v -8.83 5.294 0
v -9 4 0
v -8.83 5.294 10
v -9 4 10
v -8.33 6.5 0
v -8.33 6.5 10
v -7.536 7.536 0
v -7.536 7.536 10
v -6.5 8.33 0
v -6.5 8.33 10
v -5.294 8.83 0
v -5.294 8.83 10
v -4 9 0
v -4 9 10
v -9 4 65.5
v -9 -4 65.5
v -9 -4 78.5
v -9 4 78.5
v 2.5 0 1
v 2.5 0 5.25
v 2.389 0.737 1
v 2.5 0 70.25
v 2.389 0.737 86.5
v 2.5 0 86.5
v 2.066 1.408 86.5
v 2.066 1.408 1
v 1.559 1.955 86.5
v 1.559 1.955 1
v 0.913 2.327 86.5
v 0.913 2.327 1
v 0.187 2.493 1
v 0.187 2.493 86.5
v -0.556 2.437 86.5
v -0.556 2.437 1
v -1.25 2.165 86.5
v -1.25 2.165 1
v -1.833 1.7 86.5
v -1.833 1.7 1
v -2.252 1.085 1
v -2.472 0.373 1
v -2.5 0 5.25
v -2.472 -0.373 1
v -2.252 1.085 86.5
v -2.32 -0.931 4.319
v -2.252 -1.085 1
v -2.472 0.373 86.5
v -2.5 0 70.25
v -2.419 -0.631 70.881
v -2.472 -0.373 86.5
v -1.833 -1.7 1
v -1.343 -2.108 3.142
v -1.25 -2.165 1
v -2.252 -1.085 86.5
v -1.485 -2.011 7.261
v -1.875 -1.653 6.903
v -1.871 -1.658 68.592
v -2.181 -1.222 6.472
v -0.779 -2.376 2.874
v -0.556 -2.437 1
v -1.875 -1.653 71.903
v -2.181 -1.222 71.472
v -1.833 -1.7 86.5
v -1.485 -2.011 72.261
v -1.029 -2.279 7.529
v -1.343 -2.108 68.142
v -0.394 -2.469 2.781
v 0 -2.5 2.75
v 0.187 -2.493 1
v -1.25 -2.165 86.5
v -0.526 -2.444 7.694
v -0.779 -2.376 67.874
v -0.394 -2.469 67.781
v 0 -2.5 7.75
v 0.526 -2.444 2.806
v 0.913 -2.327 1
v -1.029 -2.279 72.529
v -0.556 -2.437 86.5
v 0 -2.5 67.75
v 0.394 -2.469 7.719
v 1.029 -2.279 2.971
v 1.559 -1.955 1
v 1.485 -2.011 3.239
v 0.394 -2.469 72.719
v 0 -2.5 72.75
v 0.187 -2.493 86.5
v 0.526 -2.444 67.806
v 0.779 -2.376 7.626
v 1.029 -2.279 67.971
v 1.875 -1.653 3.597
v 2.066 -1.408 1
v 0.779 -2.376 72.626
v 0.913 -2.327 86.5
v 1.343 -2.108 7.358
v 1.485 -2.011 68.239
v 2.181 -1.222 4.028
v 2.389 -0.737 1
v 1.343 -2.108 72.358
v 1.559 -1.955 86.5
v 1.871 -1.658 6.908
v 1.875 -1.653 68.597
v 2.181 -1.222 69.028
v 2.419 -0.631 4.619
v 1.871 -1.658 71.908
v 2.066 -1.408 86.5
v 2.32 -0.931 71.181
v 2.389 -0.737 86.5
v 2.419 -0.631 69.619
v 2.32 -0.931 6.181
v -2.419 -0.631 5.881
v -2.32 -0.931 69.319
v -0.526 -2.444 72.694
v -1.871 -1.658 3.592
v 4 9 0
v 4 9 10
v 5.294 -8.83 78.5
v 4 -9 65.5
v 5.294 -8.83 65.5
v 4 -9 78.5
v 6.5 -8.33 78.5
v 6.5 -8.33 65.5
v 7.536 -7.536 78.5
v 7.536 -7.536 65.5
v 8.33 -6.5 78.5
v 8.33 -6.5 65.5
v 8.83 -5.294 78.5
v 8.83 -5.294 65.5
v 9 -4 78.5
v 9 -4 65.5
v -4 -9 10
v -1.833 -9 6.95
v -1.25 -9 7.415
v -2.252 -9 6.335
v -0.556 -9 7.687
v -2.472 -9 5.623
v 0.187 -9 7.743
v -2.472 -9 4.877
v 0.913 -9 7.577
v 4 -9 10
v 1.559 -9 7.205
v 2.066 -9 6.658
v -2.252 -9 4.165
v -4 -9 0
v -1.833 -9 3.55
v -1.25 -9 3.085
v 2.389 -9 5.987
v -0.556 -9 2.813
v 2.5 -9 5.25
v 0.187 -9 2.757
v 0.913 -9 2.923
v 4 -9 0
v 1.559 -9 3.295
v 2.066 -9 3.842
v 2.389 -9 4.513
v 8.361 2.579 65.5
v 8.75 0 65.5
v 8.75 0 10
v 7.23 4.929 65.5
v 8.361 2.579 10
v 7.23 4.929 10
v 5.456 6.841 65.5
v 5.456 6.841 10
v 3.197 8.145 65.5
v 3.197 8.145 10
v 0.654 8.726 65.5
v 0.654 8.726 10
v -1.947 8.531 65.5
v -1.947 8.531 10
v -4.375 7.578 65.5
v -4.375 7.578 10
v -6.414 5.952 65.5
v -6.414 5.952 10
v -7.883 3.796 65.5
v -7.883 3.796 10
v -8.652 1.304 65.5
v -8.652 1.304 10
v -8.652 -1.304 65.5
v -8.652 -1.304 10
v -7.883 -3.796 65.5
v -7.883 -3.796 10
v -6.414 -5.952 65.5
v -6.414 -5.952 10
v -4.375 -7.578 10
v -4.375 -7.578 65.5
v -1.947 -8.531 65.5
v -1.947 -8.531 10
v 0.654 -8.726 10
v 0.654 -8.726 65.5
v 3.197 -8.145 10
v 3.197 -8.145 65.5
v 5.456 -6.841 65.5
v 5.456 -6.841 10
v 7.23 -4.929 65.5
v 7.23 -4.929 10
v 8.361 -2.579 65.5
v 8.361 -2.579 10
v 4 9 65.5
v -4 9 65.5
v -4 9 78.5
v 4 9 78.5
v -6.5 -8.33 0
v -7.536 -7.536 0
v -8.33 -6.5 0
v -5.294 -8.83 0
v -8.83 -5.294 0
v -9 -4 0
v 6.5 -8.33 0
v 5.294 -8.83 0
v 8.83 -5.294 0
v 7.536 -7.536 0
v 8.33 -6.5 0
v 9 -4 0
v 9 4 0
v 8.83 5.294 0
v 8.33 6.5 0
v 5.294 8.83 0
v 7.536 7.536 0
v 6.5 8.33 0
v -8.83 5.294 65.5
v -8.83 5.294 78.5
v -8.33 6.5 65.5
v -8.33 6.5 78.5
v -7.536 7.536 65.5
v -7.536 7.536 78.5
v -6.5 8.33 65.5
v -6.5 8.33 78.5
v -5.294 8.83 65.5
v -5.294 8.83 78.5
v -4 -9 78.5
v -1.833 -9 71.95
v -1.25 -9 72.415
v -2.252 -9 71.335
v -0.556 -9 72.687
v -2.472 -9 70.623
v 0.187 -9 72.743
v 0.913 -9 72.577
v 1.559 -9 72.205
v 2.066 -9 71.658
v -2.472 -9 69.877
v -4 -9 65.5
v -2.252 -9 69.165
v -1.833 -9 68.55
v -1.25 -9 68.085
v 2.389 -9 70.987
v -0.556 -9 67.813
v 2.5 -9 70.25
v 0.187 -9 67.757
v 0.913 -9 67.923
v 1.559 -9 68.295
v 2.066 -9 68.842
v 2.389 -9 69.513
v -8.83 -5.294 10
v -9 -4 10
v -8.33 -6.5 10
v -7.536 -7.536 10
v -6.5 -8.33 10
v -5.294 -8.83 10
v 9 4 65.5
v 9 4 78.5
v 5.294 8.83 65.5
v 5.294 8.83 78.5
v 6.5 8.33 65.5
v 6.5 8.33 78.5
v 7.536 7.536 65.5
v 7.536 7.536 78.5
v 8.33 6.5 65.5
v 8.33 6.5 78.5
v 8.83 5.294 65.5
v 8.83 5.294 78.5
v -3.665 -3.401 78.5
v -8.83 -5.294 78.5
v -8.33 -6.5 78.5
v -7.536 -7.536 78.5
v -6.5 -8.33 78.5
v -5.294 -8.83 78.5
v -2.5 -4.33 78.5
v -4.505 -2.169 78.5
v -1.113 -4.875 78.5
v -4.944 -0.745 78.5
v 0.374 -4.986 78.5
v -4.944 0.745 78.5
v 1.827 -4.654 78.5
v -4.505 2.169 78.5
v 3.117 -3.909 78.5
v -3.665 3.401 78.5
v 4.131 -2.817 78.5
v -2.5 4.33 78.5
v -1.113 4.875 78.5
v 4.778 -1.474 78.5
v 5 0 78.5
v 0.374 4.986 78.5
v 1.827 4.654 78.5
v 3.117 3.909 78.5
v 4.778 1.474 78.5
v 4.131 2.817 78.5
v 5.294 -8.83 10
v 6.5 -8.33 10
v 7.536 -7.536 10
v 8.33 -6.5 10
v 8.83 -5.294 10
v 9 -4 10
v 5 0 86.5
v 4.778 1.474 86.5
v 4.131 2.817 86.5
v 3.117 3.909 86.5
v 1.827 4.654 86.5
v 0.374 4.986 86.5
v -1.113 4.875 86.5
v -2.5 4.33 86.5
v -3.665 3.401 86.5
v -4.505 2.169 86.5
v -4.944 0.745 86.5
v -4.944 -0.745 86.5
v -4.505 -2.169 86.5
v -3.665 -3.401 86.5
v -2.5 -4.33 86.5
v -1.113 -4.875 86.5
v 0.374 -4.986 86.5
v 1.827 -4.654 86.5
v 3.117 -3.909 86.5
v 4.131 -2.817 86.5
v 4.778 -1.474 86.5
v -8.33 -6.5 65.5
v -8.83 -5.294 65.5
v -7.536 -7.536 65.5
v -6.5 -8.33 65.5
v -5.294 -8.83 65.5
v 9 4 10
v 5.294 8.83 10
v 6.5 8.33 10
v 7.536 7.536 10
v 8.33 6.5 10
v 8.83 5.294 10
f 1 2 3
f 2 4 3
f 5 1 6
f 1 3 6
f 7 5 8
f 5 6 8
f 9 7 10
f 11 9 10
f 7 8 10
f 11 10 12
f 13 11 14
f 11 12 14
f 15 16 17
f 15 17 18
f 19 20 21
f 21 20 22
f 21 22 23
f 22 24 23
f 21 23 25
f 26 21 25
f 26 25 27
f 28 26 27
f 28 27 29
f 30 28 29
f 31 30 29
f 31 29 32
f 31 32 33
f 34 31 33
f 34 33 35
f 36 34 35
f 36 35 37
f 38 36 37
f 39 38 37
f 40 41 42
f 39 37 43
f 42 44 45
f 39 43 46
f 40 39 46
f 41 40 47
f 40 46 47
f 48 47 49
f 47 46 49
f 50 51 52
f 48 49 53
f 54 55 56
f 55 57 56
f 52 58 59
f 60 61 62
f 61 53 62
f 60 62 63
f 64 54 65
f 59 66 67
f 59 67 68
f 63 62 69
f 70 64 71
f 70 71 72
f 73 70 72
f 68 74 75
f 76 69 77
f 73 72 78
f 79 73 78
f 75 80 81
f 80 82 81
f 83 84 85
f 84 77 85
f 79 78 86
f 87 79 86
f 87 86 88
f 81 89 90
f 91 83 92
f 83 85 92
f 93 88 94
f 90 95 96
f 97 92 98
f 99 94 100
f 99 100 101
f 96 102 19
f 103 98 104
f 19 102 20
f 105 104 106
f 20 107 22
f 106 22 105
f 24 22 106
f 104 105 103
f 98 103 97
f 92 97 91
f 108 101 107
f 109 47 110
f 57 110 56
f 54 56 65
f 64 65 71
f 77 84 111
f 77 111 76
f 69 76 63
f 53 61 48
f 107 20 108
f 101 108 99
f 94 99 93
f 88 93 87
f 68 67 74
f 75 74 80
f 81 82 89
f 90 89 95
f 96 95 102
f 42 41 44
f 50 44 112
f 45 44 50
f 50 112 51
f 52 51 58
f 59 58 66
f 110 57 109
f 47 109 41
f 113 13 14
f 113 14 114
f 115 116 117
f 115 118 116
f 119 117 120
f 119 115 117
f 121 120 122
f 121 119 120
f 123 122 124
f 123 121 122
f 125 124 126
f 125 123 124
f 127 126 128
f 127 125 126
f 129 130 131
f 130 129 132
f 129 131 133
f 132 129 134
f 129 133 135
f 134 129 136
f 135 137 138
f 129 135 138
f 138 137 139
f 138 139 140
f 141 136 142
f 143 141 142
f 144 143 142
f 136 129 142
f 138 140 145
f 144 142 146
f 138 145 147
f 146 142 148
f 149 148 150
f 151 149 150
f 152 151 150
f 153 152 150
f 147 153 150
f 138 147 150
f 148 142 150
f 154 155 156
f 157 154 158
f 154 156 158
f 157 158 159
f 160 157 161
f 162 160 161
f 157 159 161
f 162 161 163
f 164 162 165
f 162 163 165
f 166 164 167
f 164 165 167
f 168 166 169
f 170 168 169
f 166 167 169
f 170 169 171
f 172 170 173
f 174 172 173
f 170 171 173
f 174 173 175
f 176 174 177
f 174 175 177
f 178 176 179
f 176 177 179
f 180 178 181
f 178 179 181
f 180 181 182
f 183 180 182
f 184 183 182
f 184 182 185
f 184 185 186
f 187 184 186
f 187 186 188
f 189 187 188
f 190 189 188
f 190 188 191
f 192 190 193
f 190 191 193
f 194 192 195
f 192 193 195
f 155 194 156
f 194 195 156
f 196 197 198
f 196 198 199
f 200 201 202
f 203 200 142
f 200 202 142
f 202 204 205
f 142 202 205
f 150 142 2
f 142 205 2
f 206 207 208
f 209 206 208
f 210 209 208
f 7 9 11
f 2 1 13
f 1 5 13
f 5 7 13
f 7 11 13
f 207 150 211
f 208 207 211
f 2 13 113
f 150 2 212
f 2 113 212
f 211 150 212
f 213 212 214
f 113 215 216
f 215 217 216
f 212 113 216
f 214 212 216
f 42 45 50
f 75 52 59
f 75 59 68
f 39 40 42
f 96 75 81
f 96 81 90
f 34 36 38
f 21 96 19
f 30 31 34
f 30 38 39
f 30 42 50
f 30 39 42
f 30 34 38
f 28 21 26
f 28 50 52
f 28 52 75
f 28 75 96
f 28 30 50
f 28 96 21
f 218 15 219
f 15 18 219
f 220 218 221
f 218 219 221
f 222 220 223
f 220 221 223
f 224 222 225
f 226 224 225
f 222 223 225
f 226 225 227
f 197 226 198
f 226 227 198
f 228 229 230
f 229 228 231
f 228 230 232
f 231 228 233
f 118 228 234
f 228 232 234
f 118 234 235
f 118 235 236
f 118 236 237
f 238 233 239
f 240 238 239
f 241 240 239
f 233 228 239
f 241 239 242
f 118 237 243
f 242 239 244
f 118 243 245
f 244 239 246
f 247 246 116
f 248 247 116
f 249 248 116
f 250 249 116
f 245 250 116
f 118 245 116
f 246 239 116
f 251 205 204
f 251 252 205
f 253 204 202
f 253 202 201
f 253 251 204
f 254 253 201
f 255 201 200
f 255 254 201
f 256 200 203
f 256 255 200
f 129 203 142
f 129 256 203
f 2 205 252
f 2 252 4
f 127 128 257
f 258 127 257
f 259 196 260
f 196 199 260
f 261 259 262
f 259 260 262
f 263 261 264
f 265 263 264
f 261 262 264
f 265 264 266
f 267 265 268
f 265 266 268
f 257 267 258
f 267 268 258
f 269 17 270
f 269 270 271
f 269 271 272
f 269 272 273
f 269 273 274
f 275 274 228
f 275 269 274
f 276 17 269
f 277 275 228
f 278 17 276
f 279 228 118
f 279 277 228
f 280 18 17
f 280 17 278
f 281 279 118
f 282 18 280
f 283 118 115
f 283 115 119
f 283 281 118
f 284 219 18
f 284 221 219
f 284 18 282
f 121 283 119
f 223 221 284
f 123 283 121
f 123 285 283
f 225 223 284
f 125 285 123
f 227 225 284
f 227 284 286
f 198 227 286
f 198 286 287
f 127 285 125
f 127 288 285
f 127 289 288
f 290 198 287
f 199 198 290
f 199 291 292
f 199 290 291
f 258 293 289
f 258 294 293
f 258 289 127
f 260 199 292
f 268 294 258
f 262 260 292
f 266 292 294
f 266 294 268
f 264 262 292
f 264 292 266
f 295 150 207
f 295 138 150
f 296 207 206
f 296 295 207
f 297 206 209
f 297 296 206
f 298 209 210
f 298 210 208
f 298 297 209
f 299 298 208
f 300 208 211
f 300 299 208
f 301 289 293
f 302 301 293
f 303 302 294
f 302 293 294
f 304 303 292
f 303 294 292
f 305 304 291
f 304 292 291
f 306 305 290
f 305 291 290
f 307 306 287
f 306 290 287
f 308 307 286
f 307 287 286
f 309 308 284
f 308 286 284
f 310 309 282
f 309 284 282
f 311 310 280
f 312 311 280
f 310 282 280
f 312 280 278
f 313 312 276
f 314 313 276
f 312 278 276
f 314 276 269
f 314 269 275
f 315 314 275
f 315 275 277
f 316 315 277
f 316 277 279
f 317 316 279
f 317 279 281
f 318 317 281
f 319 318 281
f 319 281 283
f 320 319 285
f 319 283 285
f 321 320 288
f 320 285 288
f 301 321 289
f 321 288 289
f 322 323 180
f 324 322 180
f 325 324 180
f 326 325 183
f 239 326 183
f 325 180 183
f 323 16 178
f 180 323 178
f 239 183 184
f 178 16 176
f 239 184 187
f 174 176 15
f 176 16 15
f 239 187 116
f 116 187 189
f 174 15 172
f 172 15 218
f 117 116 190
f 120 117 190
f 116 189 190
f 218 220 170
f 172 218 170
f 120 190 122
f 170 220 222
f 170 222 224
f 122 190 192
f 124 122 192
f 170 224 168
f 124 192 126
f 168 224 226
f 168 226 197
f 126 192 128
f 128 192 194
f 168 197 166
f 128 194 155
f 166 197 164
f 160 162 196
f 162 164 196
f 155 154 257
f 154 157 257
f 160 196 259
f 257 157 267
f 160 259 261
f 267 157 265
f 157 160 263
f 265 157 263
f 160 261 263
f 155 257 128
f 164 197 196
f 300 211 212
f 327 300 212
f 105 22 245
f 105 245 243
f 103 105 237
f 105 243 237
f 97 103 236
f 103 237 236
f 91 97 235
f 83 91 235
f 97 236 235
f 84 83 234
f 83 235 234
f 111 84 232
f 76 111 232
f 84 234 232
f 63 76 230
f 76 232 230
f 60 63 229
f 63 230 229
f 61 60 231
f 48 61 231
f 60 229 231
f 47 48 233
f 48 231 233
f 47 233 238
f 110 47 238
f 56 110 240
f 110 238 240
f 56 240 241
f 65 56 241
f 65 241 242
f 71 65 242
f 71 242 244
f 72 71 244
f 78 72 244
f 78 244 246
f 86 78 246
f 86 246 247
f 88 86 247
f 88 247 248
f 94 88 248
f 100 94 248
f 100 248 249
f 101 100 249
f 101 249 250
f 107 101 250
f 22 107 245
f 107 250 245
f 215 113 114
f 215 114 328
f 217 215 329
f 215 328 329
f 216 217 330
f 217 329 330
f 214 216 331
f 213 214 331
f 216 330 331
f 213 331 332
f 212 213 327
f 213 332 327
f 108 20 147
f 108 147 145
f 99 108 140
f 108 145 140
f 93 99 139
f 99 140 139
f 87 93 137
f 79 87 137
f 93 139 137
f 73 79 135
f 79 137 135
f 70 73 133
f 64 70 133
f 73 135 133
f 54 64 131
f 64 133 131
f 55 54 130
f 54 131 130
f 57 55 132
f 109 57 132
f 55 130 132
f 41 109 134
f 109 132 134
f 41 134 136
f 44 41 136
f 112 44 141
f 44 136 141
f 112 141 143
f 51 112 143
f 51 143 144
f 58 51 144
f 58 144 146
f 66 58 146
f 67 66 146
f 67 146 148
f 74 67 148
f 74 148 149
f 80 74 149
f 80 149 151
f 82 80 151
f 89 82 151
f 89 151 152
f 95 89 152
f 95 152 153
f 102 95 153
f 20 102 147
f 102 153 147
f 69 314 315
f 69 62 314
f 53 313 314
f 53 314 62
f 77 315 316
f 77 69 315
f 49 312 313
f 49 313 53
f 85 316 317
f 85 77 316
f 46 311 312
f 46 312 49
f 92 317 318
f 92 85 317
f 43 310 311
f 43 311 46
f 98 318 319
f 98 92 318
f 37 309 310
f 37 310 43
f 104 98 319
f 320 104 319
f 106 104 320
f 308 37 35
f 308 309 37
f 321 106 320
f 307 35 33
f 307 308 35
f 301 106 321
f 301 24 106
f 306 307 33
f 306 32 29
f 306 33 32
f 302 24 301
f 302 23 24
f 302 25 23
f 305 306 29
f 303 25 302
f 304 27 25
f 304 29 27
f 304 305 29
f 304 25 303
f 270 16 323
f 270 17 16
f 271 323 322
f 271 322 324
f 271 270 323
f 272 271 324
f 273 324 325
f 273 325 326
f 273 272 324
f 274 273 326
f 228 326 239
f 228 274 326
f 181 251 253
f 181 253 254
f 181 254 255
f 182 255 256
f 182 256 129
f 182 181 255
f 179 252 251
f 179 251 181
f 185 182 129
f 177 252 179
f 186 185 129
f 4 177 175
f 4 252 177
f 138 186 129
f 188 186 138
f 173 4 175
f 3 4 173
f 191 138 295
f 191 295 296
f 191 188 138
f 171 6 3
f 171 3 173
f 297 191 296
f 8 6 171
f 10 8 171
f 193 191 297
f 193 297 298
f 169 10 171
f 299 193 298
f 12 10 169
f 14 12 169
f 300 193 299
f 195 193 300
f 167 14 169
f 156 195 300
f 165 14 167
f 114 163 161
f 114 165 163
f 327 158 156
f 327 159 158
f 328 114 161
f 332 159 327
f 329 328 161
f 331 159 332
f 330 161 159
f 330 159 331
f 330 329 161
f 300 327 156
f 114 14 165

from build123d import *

# Parameters (mm, degrees)
SKETCH_1_W          = 18
SKETCH_1_H          = 18
EXTRUDE_1_DEPTH     = 10
SKETCH_2_R          = 8.75
EXTRUDE_2_DEPTH     = 55.5
SKETCH_3_W          = 18
SKETCH_3_H          = 18
EXTRUDE_3_DEPTH     = 13
SKETCH_4_R          = 5
EXTRUDE_4_DEPTH     = 8
SKETCH_5_R          = 2.5
CUT_EXTRUDE_1_DEPTH = 85.5
FILLET_1_R          = 5
CUT_EXTRUDE_2_REACH = 20
SKETCH_6_R          = 2.5


with BuildPart() as part:
    # 草图1 → 凸台-拉伸1 (new body)
    with BuildSketch(Plane.XY):
        Rectangle(SKETCH_1_W, SKETCH_1_H)
    extrude(amount=EXTRUDE_1_DEPTH)

    # 草图2 → 凸台-拉伸2 (add)
    with BuildSketch(Plane.XY.offset(10)):
        Circle(SKETCH_2_R)
    extrude(amount=EXTRUDE_2_DEPTH)

    # 草图3 → 凸台-拉伸3 (add)
    with BuildSketch(Plane.XY.offset(65.5)):
        Rectangle(SKETCH_3_W, SKETCH_3_H)
    extrude(amount=EXTRUDE_3_DEPTH)

    # 草图4 → 凸台-拉伸4 (add)
    with BuildSketch(Plane.XY.offset(78.5)):
        Circle(SKETCH_4_R)
    extrude(amount=EXTRUDE_4_DEPTH)

    # 草图5 → 切除-拉伸1 (cut)
    with BuildSketch(Plane.XY.offset(86.5)):
        Circle(SKETCH_5_R)
    extrude(amount=-CUT_EXTRUDE_1_DEPTH, mode=Mode.SUBTRACT)

    # 圆角1
    fillet_1_edges = [part.edges().sort_by_distance(p)[0] for p in [
        (9, -9, 72),
        (9, 9, 72),
        (-9, 9, 72),
        (-9, -9, 72),
        (9, -9, 5),
        (-9, -9, 5),
        (-9, 9, 5),
        (9, 9, 5),
    ]]
    fillet(fillet_1_edges, radius=FILLET_1_R)

    # 草图6 → 切除-拉伸2 (cut, up to next)
    with BuildSketch(Plane.XZ.offset(9), mode=Mode.PRIVATE) as cut_extrude_2_sk1:
        with Locations((0, 5.25)):
            Circle(SKETCH_6_R)
    cut_extrude_2_tool1 = extrude(cut_extrude_2_sk1.sketch, amount=-CUT_EXTRUDE_2_REACH, mode=Mode.PRIVATE) & part.part
    add(cut_extrude_2_tool1.solids().sort_by_distance((0, -9, 5.25))[0], mode=Mode.SUBTRACT)
    # 草图6 → 切除-拉伸2 (cut, up to next)
    with BuildSketch(Plane.XZ.offset(9), mode=Mode.PRIVATE) as cut_extrude_2_sk2:
        with Locations((0, 70.25)):
            Circle(SKETCH_6_R)
    cut_extrude_2_tool2 = extrude(cut_extrude_2_sk2.sketch, amount=-CUT_EXTRUDE_2_REACH, mode=Mode.PRIVATE) & part.part
    add(cut_extrude_2_tool2.solids().sort_by_distance((0, -9, 70.25))[0], mode=Mode.SUBTRACT)


solid = part.part
